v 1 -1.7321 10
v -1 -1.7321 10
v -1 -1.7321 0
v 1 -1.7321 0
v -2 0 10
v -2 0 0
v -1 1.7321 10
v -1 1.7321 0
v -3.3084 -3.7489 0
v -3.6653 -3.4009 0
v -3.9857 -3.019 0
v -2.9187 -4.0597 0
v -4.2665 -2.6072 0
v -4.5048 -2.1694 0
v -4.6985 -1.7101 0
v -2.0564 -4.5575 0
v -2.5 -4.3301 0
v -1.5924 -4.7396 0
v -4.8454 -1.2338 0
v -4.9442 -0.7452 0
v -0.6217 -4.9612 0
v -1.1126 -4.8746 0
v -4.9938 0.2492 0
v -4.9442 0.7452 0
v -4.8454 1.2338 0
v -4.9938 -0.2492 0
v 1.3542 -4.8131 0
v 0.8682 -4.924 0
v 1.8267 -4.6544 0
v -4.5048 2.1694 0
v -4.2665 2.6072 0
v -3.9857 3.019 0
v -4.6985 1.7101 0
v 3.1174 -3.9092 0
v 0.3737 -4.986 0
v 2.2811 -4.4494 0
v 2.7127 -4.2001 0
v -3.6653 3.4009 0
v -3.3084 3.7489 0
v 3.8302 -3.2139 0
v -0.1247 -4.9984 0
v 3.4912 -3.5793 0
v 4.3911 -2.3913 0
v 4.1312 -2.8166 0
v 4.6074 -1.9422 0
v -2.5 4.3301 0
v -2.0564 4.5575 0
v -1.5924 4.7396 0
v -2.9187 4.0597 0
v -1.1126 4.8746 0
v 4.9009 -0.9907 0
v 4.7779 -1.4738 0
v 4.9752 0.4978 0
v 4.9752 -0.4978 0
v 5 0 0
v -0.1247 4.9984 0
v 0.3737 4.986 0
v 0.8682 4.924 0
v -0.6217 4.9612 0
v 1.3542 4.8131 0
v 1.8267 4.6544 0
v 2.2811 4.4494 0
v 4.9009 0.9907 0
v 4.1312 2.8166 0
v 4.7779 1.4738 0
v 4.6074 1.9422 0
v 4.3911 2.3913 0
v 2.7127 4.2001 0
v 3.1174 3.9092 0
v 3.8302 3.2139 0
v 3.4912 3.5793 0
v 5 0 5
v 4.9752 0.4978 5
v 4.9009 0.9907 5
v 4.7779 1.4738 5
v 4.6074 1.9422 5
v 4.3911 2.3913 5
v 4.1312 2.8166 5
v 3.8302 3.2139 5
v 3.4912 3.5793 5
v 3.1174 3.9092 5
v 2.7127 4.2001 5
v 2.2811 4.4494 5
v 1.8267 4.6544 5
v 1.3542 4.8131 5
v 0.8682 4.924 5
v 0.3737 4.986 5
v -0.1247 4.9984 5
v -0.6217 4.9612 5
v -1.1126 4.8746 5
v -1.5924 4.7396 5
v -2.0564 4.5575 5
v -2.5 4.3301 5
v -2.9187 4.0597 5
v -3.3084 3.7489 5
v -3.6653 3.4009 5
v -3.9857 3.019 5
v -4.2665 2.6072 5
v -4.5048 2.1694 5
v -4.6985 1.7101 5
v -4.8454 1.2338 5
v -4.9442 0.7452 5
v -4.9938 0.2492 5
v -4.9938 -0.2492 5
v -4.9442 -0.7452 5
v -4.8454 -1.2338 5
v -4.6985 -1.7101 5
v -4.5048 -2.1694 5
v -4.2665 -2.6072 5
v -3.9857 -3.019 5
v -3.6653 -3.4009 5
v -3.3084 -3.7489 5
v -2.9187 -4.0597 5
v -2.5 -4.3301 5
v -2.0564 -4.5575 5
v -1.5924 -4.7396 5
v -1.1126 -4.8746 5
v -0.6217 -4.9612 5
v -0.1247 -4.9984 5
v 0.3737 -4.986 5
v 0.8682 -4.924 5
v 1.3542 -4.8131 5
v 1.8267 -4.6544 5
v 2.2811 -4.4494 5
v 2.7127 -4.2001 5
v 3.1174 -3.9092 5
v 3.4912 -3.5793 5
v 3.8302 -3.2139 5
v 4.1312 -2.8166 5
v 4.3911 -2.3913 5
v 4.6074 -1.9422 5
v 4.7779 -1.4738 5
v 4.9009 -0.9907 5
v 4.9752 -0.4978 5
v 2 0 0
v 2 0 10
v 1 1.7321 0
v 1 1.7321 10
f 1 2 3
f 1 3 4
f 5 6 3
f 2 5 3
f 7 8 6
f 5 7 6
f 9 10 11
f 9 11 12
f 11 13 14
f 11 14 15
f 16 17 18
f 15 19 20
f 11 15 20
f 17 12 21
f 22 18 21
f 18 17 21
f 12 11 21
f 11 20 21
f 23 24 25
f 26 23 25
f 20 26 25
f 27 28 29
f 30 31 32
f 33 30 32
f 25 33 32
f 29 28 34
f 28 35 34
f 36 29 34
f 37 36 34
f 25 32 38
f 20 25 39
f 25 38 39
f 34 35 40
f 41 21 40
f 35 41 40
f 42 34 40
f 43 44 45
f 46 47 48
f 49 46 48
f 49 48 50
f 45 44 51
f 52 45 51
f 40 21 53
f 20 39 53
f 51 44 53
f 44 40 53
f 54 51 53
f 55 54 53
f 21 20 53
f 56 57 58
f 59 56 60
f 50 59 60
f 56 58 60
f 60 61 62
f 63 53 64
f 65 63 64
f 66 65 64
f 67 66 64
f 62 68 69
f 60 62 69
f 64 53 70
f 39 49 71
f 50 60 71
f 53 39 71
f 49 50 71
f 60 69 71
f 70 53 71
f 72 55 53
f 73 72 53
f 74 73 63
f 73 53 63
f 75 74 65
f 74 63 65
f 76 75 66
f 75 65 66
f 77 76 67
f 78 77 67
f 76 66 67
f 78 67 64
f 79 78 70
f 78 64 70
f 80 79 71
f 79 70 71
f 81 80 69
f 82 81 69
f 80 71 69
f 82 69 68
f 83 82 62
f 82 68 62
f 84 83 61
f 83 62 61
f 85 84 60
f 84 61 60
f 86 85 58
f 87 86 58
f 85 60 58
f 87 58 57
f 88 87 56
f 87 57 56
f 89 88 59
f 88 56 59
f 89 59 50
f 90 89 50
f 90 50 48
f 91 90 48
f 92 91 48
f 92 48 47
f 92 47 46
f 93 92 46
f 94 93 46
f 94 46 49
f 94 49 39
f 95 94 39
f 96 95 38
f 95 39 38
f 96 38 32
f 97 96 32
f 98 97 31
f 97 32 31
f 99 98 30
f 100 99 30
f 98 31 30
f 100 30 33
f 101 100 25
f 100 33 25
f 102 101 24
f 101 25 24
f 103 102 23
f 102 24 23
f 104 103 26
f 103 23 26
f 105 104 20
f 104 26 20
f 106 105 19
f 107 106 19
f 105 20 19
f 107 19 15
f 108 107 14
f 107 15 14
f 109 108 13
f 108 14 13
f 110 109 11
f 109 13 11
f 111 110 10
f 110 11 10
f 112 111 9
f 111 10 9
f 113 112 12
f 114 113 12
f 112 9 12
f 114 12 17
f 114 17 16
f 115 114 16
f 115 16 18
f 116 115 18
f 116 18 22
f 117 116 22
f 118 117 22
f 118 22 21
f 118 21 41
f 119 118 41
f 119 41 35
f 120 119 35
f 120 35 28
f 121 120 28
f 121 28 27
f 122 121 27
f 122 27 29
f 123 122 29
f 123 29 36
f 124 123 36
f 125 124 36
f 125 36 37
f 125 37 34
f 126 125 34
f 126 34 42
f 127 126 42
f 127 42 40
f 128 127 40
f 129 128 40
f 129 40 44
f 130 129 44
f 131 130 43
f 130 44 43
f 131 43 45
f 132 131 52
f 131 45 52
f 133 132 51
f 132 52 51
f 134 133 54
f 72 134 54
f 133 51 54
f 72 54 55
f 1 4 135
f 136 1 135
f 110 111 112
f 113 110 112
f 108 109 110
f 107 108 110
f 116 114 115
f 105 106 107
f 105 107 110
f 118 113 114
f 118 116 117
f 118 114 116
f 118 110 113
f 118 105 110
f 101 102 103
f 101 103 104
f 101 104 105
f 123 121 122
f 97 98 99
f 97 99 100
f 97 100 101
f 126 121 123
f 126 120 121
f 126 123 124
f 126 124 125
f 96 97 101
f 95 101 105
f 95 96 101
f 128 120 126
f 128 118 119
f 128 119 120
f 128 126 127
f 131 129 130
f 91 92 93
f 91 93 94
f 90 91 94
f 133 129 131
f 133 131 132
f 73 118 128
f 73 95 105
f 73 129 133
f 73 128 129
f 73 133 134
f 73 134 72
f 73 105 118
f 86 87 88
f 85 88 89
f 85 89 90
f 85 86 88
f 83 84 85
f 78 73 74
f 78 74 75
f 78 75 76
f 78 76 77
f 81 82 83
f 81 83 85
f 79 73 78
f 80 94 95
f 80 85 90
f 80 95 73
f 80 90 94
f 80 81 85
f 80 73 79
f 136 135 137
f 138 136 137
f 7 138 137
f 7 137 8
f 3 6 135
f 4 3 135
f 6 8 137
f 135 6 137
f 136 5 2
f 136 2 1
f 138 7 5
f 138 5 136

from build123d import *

# Parameters (mm, degrees)
CYLINDER_R     = 5
CYLINDER_DEPTH = 5
PRISM_DEPTH    = 10


with BuildPart() as cylinder:
    # Cylinder → Cylinder (new body)
    with BuildSketch(Plane.XY):
        Circle(CYLINDER_R)
    extrude(amount=CYLINDER_DEPTH)


with BuildPart() as prism:
    # Prism → Prism (new body)
    with BuildSketch(Plane.XY):
        Polygon((2, 0), (1, 1.732051), (-1, 1.732051), (-2, 0), (-1, -1.732051), (1, -1.732051), align=None)
    extrude(amount=PRISM_DEPTH)


solid = Compound([cylinder.part, prism.part])
